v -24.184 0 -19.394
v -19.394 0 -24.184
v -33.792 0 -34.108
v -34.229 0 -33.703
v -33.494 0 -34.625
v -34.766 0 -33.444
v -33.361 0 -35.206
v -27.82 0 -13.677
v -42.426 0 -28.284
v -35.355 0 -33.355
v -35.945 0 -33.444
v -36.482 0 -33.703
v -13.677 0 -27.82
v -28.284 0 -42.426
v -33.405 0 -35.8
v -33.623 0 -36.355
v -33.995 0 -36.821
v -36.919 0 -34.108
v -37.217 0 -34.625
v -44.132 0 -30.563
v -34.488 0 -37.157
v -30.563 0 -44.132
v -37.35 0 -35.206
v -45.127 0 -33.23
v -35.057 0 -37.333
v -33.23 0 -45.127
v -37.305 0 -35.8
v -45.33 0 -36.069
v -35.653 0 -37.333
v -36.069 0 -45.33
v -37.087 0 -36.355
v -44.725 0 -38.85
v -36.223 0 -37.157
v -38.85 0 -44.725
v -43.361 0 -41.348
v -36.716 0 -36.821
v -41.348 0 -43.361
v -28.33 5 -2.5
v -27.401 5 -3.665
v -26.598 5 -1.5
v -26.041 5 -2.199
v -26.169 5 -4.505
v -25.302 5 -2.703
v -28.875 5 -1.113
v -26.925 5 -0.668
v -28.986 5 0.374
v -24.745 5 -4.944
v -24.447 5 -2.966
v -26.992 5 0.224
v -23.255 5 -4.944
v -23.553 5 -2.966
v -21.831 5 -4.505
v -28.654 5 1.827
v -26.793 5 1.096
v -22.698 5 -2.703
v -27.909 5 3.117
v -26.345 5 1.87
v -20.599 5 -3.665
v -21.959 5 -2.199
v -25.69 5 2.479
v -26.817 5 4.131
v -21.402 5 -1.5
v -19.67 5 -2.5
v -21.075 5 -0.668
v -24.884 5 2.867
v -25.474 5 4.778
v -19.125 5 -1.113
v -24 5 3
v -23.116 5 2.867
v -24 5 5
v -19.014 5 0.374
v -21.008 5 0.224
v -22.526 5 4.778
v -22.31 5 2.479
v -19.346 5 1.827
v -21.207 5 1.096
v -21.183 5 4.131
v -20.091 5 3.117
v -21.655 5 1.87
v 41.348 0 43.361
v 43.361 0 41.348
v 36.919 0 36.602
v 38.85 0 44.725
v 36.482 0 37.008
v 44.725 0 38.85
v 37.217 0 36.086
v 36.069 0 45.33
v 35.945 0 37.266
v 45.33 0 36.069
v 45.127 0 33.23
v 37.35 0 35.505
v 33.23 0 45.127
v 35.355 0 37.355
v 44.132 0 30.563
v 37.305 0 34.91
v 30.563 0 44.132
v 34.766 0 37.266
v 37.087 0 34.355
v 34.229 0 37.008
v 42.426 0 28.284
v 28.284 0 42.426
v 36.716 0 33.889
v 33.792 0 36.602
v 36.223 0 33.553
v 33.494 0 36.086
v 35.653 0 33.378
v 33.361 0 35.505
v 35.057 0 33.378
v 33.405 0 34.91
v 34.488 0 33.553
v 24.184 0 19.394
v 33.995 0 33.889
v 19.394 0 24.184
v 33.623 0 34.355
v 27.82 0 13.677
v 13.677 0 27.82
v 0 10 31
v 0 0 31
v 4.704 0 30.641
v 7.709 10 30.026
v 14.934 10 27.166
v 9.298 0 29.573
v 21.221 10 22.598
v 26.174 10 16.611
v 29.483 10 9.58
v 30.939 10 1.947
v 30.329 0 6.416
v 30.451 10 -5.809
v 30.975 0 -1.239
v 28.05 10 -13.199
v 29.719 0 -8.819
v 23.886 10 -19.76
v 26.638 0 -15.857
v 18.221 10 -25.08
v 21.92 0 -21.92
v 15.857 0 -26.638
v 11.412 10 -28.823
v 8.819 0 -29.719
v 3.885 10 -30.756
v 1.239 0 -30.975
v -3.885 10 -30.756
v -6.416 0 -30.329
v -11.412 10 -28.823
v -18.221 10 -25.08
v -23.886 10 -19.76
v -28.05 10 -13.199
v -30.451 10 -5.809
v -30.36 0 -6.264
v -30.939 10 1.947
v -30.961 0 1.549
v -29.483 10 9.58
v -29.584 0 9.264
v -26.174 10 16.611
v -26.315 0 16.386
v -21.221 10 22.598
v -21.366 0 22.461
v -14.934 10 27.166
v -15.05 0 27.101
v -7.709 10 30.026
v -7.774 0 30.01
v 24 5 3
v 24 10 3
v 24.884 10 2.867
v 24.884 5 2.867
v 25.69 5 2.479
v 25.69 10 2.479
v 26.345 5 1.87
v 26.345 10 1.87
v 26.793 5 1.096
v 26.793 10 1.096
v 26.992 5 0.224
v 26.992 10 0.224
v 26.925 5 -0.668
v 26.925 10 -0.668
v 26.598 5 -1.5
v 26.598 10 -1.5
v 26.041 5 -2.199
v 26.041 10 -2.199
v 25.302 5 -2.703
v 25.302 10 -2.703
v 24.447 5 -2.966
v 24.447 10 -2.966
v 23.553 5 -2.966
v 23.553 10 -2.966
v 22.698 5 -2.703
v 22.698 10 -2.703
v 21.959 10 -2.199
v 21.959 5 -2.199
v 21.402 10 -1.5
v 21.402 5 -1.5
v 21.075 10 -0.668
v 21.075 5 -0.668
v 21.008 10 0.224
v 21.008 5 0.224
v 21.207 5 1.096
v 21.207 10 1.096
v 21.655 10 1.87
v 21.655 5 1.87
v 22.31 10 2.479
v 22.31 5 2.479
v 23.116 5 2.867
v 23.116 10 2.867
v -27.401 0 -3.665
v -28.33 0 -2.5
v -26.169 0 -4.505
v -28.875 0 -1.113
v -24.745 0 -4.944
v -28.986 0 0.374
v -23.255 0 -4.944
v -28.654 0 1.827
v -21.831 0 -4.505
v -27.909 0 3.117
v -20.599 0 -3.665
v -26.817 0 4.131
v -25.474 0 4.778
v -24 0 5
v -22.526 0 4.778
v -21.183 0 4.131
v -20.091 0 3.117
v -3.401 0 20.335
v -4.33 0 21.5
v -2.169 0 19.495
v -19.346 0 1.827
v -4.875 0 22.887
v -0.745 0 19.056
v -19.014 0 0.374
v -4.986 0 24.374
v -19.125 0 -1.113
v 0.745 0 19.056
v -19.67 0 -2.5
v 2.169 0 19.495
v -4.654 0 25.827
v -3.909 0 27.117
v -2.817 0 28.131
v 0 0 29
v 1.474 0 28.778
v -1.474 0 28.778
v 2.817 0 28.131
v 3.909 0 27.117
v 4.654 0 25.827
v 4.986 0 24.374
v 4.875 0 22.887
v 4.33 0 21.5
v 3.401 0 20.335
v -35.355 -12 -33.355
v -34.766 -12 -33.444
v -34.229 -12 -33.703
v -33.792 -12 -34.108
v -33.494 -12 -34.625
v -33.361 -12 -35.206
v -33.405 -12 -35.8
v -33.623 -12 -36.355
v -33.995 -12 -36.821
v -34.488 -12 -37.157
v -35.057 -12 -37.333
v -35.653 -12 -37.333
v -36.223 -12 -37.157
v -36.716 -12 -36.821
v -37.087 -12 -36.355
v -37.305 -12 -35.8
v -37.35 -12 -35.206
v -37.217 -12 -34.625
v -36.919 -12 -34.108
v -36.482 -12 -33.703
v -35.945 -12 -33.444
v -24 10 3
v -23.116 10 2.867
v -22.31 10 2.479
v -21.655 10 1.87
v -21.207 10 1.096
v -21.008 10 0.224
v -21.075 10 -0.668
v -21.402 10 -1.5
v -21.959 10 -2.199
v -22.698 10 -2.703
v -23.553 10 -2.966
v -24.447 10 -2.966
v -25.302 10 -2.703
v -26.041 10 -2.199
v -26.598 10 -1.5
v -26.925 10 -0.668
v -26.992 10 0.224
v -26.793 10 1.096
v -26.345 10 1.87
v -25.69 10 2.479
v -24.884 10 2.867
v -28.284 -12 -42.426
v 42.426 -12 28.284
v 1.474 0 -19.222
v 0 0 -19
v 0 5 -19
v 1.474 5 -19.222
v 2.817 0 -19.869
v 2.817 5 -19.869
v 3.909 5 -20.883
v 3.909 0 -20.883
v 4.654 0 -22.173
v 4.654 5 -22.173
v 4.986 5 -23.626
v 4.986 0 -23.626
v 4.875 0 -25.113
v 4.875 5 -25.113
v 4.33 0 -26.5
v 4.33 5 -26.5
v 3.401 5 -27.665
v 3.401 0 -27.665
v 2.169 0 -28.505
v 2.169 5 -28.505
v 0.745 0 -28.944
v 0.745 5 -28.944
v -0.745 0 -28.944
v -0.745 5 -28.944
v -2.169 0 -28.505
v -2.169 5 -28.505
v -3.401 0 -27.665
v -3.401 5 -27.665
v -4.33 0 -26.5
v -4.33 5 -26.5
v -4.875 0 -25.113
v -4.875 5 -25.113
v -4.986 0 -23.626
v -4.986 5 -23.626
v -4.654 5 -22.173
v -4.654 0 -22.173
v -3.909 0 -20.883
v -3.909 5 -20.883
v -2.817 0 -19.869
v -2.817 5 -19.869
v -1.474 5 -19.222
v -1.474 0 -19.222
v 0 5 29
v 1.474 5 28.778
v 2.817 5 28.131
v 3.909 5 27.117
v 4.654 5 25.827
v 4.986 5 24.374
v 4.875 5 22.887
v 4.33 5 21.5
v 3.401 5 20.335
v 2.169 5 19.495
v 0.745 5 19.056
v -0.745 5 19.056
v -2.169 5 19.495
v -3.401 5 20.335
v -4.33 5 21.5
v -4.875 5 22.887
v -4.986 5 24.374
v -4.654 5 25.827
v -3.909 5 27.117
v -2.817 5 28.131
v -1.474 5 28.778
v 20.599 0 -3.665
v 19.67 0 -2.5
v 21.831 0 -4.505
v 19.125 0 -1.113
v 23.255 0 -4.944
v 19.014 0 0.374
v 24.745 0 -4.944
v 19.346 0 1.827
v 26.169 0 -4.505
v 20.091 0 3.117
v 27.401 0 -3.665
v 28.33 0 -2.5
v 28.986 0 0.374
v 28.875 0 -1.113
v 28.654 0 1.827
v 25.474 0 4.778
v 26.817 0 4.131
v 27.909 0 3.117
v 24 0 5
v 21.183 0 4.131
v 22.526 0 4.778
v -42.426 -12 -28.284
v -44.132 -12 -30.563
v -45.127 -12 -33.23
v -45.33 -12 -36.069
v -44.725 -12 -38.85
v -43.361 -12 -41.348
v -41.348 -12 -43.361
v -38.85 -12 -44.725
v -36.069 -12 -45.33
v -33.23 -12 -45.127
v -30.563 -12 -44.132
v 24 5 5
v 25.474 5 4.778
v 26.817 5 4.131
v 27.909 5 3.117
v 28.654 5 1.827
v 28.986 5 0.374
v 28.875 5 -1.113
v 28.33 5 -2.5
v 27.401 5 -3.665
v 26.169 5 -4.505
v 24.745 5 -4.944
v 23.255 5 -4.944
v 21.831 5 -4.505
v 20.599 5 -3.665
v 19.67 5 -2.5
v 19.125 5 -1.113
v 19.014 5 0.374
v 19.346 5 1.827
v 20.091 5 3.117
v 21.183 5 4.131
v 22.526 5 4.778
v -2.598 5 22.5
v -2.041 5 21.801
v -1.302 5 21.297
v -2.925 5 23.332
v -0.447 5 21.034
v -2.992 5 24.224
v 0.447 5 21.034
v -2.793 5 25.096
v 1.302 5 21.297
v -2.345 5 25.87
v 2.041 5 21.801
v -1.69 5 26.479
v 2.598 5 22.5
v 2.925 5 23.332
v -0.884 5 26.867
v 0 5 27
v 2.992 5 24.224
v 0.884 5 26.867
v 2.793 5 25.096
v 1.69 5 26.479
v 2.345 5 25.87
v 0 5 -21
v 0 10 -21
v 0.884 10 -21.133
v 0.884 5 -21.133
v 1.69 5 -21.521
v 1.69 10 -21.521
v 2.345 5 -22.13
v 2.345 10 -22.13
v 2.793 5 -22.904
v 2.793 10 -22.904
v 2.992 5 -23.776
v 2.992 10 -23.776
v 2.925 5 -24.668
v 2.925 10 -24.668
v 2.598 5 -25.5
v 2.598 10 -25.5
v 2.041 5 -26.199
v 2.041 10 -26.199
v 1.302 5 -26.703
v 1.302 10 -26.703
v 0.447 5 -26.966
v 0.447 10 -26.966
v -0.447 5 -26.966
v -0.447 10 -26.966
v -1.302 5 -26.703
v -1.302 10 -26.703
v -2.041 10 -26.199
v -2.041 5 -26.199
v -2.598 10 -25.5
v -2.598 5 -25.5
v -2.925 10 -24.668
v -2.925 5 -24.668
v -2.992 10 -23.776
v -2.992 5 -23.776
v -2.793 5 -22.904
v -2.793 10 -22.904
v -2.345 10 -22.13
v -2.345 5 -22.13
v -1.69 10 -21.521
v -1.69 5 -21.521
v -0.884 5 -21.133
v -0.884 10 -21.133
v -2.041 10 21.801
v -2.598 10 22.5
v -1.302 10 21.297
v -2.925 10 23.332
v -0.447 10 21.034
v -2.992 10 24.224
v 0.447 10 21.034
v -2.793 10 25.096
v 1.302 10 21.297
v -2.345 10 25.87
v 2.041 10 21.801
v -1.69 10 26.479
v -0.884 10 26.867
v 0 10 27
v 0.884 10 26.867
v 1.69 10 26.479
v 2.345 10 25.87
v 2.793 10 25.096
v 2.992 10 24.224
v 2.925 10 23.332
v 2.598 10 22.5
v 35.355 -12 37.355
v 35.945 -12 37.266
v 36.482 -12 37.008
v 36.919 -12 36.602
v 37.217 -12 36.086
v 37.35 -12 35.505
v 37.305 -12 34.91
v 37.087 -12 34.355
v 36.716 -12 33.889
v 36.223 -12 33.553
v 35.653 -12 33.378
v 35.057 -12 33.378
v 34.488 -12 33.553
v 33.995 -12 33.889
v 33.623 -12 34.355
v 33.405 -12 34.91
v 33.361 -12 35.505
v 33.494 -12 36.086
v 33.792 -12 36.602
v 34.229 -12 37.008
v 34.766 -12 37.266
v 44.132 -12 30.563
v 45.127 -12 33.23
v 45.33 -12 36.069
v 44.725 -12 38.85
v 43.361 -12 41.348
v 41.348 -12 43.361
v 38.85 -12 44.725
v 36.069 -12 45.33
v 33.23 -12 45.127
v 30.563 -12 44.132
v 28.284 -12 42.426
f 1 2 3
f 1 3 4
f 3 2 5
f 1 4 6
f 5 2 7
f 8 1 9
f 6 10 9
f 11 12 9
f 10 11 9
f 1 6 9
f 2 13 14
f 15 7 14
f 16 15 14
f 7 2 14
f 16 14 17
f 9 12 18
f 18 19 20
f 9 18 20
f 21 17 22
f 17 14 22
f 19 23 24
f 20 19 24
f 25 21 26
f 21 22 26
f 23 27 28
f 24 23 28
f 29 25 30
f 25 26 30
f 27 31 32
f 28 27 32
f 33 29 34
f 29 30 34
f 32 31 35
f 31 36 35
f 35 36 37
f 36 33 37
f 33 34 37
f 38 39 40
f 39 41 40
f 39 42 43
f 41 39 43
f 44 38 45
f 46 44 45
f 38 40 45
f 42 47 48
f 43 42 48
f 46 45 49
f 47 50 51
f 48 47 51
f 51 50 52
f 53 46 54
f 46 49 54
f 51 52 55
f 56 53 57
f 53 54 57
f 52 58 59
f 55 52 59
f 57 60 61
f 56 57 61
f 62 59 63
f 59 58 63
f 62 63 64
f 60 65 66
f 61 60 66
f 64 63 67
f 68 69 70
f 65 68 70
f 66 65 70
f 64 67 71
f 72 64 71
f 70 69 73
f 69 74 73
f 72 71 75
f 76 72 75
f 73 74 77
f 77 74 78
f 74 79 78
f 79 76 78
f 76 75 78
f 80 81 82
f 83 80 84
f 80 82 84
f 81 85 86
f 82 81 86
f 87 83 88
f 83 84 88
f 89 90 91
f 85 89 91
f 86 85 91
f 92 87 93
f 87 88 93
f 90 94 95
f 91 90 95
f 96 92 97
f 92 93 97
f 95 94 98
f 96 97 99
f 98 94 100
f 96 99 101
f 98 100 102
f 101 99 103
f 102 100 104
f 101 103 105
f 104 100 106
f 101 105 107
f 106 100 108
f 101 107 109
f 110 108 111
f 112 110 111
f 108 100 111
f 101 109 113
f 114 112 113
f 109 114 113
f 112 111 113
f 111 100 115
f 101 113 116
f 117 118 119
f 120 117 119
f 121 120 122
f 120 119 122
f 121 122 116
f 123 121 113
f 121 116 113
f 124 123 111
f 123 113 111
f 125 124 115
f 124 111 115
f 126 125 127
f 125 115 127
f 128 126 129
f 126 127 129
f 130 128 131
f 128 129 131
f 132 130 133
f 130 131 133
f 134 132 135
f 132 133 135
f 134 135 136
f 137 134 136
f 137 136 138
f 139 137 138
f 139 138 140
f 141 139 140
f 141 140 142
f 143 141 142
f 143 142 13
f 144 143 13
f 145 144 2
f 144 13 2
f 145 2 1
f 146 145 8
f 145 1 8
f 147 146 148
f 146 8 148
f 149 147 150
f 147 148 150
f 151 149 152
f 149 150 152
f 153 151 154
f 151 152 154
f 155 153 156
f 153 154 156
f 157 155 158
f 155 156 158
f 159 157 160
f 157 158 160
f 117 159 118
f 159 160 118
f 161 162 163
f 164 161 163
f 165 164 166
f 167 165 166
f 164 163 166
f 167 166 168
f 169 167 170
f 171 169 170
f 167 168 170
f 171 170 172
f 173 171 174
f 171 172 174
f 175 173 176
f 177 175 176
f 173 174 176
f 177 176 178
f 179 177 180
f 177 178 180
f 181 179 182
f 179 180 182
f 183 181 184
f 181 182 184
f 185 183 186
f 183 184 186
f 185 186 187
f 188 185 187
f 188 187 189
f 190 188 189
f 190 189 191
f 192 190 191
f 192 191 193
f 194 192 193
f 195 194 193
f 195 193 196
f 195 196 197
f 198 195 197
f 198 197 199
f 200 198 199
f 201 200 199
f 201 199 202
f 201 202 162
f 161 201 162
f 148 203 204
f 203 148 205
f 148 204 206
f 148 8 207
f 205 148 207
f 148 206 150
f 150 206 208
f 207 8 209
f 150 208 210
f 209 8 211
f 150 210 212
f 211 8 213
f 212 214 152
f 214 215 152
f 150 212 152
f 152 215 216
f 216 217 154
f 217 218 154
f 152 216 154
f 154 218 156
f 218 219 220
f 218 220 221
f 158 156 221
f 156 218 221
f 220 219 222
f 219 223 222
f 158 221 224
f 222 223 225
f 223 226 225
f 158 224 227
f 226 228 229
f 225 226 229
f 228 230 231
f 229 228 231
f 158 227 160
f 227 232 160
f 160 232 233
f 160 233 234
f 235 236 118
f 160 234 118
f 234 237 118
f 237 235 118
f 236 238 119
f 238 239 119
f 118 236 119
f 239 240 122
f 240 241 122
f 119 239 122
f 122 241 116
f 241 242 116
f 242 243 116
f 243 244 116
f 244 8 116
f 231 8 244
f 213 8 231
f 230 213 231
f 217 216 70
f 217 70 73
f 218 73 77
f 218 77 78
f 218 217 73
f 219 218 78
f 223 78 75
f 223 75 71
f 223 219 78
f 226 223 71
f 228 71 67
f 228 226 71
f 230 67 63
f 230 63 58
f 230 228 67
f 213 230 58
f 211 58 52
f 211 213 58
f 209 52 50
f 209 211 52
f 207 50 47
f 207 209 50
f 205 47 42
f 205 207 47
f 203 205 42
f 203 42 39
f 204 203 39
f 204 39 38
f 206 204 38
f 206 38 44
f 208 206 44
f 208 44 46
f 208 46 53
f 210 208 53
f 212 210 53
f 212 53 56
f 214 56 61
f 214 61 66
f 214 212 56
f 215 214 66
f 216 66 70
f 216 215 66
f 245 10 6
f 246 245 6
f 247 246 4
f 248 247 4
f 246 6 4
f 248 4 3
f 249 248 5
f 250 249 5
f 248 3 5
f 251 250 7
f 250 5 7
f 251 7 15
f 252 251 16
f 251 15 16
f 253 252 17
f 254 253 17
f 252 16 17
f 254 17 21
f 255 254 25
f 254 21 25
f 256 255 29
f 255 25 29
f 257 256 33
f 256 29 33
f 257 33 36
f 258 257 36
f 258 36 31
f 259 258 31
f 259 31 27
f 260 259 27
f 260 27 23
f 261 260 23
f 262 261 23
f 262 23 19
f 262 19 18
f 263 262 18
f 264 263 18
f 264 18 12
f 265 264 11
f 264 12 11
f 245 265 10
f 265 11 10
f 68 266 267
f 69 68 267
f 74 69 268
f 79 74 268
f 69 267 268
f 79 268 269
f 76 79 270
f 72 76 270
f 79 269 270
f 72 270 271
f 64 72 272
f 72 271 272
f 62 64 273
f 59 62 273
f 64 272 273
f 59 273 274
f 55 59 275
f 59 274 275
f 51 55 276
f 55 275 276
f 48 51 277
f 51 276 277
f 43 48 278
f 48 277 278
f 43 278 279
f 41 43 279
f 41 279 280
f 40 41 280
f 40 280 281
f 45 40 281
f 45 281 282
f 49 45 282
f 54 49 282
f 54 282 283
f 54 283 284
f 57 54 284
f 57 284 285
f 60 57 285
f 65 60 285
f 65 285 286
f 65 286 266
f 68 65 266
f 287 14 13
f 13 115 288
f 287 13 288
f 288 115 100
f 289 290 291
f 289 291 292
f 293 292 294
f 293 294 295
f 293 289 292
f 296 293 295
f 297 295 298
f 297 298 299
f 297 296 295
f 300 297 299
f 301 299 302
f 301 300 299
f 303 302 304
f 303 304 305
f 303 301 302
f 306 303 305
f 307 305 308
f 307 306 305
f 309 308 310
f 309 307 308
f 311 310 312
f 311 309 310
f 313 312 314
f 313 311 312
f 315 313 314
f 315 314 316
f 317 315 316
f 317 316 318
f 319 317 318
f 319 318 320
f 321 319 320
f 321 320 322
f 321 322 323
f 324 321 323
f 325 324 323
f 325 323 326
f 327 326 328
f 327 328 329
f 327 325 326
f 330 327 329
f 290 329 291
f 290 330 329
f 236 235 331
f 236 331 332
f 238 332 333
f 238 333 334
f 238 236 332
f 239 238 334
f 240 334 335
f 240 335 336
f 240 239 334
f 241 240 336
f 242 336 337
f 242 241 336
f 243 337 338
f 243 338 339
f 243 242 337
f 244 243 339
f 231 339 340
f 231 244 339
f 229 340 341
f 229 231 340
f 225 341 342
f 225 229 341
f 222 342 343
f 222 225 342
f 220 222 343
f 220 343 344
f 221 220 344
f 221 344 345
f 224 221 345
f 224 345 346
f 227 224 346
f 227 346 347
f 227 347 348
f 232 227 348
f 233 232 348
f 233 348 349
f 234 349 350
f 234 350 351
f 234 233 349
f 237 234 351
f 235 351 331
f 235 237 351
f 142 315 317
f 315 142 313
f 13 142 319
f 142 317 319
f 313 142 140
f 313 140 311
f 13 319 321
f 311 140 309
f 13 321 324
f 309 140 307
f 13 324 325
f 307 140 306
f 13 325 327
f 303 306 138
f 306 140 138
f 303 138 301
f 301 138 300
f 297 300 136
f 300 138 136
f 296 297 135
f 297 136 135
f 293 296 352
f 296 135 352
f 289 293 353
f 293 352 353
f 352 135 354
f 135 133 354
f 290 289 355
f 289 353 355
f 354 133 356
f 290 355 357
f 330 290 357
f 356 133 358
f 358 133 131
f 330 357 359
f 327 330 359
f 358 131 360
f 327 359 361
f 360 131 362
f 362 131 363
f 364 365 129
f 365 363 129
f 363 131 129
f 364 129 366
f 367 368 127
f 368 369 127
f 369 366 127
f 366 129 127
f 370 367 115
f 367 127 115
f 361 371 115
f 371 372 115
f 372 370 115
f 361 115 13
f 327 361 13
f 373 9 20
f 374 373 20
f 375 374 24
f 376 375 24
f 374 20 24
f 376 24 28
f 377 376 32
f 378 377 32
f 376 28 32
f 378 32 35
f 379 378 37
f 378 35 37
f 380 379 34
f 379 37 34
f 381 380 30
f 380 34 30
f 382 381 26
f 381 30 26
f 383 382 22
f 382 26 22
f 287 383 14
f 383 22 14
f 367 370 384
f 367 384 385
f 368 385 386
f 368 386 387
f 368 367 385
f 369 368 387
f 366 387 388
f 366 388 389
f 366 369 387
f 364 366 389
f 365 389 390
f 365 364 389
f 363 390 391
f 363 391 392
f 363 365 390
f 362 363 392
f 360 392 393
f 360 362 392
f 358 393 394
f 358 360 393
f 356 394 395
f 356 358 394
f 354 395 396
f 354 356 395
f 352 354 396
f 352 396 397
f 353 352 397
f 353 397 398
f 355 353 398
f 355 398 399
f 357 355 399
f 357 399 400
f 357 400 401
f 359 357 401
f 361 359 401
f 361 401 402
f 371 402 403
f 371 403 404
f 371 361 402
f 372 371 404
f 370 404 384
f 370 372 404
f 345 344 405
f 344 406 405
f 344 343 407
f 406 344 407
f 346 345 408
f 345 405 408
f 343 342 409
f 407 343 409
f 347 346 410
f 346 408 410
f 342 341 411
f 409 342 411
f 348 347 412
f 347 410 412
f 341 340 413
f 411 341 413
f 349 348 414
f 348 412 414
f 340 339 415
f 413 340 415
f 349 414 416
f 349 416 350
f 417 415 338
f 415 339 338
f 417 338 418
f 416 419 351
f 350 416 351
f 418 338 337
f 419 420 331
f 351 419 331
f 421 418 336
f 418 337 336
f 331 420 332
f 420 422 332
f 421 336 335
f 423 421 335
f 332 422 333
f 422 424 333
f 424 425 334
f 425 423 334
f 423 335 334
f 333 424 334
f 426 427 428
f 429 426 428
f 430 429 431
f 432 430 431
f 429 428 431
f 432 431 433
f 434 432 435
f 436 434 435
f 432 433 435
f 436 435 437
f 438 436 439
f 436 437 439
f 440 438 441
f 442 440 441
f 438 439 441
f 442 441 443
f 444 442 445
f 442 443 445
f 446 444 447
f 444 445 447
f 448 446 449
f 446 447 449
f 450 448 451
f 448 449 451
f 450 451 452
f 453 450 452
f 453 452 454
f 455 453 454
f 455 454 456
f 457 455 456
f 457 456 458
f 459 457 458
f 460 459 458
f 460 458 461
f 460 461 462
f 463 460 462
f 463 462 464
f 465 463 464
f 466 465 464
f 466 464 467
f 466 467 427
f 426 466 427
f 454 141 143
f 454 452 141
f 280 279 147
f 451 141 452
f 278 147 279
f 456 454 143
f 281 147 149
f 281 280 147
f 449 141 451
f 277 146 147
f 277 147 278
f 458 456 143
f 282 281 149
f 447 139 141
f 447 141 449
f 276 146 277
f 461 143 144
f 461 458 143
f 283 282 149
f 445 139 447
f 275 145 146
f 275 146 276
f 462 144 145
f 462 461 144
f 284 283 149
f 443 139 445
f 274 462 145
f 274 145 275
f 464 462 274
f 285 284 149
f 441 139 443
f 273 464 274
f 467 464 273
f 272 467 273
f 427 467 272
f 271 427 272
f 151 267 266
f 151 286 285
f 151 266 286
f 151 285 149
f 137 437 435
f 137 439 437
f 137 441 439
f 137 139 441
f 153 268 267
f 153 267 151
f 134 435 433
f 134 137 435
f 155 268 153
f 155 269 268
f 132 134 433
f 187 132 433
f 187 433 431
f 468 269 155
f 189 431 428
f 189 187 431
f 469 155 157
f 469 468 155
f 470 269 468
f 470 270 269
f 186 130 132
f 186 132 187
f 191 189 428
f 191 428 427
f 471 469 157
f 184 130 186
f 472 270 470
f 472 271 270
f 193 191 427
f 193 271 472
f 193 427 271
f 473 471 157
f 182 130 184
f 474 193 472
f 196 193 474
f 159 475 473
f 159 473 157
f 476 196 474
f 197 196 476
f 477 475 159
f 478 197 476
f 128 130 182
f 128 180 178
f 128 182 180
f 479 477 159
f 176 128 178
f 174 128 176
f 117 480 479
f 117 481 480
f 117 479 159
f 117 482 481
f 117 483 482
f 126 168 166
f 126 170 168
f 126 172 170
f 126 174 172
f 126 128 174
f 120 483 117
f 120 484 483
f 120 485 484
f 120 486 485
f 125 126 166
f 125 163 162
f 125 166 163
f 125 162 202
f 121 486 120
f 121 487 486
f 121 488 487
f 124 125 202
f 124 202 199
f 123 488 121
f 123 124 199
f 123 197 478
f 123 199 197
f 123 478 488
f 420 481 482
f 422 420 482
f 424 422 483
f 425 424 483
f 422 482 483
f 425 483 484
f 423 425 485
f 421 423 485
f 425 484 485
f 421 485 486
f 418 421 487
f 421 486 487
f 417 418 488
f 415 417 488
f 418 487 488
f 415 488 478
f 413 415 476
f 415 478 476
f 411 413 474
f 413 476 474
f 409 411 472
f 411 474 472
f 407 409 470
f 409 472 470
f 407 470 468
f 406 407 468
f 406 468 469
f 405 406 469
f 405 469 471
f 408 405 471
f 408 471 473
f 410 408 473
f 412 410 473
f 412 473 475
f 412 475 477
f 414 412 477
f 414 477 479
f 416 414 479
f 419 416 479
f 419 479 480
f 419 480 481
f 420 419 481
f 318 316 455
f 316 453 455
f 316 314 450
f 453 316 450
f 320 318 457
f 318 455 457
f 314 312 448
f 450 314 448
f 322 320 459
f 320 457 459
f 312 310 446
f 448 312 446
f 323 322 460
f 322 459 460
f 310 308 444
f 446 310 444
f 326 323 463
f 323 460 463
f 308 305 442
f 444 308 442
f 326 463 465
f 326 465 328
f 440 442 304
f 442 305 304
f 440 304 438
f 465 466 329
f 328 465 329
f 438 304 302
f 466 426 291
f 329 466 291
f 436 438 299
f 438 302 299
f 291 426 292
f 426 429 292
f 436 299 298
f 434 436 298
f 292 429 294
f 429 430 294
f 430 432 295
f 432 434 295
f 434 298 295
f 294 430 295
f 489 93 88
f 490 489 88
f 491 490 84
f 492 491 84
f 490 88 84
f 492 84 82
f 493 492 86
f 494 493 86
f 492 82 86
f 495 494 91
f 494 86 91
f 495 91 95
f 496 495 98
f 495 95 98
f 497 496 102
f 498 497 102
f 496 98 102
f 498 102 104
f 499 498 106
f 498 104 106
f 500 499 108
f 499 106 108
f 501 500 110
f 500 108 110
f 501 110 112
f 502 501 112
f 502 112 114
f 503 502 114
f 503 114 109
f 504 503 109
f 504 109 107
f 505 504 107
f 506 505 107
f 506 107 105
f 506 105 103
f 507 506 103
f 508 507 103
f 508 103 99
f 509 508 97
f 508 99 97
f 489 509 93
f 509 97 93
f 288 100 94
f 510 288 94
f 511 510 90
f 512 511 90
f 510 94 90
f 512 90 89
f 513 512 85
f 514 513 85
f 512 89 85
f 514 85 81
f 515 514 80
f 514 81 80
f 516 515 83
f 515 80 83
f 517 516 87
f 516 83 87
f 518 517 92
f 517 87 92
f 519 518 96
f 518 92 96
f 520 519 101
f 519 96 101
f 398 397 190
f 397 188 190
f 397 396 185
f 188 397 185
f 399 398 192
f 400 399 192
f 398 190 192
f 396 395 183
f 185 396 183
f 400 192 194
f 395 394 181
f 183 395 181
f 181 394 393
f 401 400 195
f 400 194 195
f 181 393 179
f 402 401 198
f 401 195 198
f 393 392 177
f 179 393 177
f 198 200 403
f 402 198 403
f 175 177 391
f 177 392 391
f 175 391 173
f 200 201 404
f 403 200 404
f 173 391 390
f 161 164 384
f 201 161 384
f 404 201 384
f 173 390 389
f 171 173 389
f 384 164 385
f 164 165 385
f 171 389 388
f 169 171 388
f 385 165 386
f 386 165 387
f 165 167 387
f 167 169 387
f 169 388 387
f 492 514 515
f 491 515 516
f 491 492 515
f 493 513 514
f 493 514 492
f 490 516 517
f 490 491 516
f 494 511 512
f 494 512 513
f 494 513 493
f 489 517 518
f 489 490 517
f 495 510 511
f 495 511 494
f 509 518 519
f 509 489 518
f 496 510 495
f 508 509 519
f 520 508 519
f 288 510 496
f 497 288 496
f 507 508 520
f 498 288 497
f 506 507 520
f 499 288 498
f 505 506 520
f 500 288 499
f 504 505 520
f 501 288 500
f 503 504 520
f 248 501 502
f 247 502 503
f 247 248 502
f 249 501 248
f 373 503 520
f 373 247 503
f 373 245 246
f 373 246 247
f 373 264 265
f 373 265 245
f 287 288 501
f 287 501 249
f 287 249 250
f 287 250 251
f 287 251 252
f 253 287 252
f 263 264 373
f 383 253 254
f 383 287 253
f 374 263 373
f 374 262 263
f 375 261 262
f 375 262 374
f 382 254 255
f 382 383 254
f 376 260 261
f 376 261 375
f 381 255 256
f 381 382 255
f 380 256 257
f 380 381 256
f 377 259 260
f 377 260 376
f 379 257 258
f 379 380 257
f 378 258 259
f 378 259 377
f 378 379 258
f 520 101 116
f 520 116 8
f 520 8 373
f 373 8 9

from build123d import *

# Parameters (mm, degrees)
SKETCH1_R           = 31
BOSS_EXTRUDE1_DEPTH = 10
SKETCH2_R           = 3
CUT_EXTRUDE11_DEPTH = 10
SKETCH5_R           = 5
CUT_EXTRUDE14_DEPTH = 5
SKETCH6_R           = 2
BOSS_EXTRUDE5_DEPTH = 12


with BuildPart() as part:
    # Sketch1 → Boss-Extrude1 (new body)
    with BuildSketch(Plane(origin=(0, 0, 0), x_dir=(1, 0, 0), z_dir=(0, 1, 0))):
        with Locations(Location((0, 0, 0), (0, 0, 270))):
            Circle(SKETCH1_R)
    extrude(amount=BOSS_EXTRUDE1_DEPTH)

    # Sketch2 → Cut-Extrude11 (cut)
    with BuildSketch(Plane(origin=(0, 10, 0), x_dir=(1, 0, 0), z_dir=(0, 1, 0))):
        with Locations(Location((0, 24, 0), (0, 0, 270))):
            Circle(SKETCH2_R)
        with Locations(Location((24, 0, 0), (0, 0, 270))):
            Circle(SKETCH2_R)
        with Locations(Location((0, -24, 0), (0, 0, 270))):
            Circle(SKETCH2_R)
        with Locations(Location((-24, 0, 0), (0, 0, 270))):
            Circle(SKETCH2_R)
    extrude(amount=-CUT_EXTRUDE11_DEPTH, mode=Mode.SUBTRACT)

    # Sketch5 → Cut-Extrude14 (cut)
    with BuildSketch(Plane(origin=(0, 0, 0), x_dir=(1, 0, 0), z_dir=(0, 1, 0))):
        with Locations(Location((0, 24, 0), (0, 0, 270))):
            Circle(SKETCH5_R)
        with Locations(Location((24, 0, 0), (0, 0, 270))):
            Circle(SKETCH5_R)
        with Locations(Location((0, -24, 0), (0, 0, 270))):
            Circle(SKETCH5_R)
        with Locations(Location((-24, 0, 0), (0, 0, 270))):
            Circle(SKETCH5_R)
    extrude(amount=CUT_EXTRUDE14_DEPTH, mode=Mode.SUBTRACT)

    # Sketch6 → Boss-Extrude5 (add)
    with BuildSketch(Plane(origin=(0, 0, 0), x_dir=(1, 0, 0), z_dir=(0, 1, 0))):
        with BuildLine():
            Line((28.284271247, -42.426406871), (-42.426406871, 28.284271247))
            ThreePointArc((-42.426406871, 28.284271247), (-42.426406871, 42.426406871), (-28.284271247, 42.426406871))
            Line((-28.284271247, 42.426406871), (42.426406871, -28.284271247))
            ThreePointArc((42.426406871, -28.284271247), (42.426406871, -42.426406871), (28.284271247, -42.426406871))
        make_face()
        with Locations(Location((-35.355339059, 35.355339059, 0), (0, 0, 270))):
            Circle(SKETCH6_R, mode=Mode.SUBTRACT)
        with Locations(Location((35.355339059, -35.355339059, 0), (0, 0, 270))):
            Circle(SKETCH6_R, mode=Mode.SUBTRACT)
    extrude(amount=-BOSS_EXTRUDE5_DEPTH)


solid = part.part
